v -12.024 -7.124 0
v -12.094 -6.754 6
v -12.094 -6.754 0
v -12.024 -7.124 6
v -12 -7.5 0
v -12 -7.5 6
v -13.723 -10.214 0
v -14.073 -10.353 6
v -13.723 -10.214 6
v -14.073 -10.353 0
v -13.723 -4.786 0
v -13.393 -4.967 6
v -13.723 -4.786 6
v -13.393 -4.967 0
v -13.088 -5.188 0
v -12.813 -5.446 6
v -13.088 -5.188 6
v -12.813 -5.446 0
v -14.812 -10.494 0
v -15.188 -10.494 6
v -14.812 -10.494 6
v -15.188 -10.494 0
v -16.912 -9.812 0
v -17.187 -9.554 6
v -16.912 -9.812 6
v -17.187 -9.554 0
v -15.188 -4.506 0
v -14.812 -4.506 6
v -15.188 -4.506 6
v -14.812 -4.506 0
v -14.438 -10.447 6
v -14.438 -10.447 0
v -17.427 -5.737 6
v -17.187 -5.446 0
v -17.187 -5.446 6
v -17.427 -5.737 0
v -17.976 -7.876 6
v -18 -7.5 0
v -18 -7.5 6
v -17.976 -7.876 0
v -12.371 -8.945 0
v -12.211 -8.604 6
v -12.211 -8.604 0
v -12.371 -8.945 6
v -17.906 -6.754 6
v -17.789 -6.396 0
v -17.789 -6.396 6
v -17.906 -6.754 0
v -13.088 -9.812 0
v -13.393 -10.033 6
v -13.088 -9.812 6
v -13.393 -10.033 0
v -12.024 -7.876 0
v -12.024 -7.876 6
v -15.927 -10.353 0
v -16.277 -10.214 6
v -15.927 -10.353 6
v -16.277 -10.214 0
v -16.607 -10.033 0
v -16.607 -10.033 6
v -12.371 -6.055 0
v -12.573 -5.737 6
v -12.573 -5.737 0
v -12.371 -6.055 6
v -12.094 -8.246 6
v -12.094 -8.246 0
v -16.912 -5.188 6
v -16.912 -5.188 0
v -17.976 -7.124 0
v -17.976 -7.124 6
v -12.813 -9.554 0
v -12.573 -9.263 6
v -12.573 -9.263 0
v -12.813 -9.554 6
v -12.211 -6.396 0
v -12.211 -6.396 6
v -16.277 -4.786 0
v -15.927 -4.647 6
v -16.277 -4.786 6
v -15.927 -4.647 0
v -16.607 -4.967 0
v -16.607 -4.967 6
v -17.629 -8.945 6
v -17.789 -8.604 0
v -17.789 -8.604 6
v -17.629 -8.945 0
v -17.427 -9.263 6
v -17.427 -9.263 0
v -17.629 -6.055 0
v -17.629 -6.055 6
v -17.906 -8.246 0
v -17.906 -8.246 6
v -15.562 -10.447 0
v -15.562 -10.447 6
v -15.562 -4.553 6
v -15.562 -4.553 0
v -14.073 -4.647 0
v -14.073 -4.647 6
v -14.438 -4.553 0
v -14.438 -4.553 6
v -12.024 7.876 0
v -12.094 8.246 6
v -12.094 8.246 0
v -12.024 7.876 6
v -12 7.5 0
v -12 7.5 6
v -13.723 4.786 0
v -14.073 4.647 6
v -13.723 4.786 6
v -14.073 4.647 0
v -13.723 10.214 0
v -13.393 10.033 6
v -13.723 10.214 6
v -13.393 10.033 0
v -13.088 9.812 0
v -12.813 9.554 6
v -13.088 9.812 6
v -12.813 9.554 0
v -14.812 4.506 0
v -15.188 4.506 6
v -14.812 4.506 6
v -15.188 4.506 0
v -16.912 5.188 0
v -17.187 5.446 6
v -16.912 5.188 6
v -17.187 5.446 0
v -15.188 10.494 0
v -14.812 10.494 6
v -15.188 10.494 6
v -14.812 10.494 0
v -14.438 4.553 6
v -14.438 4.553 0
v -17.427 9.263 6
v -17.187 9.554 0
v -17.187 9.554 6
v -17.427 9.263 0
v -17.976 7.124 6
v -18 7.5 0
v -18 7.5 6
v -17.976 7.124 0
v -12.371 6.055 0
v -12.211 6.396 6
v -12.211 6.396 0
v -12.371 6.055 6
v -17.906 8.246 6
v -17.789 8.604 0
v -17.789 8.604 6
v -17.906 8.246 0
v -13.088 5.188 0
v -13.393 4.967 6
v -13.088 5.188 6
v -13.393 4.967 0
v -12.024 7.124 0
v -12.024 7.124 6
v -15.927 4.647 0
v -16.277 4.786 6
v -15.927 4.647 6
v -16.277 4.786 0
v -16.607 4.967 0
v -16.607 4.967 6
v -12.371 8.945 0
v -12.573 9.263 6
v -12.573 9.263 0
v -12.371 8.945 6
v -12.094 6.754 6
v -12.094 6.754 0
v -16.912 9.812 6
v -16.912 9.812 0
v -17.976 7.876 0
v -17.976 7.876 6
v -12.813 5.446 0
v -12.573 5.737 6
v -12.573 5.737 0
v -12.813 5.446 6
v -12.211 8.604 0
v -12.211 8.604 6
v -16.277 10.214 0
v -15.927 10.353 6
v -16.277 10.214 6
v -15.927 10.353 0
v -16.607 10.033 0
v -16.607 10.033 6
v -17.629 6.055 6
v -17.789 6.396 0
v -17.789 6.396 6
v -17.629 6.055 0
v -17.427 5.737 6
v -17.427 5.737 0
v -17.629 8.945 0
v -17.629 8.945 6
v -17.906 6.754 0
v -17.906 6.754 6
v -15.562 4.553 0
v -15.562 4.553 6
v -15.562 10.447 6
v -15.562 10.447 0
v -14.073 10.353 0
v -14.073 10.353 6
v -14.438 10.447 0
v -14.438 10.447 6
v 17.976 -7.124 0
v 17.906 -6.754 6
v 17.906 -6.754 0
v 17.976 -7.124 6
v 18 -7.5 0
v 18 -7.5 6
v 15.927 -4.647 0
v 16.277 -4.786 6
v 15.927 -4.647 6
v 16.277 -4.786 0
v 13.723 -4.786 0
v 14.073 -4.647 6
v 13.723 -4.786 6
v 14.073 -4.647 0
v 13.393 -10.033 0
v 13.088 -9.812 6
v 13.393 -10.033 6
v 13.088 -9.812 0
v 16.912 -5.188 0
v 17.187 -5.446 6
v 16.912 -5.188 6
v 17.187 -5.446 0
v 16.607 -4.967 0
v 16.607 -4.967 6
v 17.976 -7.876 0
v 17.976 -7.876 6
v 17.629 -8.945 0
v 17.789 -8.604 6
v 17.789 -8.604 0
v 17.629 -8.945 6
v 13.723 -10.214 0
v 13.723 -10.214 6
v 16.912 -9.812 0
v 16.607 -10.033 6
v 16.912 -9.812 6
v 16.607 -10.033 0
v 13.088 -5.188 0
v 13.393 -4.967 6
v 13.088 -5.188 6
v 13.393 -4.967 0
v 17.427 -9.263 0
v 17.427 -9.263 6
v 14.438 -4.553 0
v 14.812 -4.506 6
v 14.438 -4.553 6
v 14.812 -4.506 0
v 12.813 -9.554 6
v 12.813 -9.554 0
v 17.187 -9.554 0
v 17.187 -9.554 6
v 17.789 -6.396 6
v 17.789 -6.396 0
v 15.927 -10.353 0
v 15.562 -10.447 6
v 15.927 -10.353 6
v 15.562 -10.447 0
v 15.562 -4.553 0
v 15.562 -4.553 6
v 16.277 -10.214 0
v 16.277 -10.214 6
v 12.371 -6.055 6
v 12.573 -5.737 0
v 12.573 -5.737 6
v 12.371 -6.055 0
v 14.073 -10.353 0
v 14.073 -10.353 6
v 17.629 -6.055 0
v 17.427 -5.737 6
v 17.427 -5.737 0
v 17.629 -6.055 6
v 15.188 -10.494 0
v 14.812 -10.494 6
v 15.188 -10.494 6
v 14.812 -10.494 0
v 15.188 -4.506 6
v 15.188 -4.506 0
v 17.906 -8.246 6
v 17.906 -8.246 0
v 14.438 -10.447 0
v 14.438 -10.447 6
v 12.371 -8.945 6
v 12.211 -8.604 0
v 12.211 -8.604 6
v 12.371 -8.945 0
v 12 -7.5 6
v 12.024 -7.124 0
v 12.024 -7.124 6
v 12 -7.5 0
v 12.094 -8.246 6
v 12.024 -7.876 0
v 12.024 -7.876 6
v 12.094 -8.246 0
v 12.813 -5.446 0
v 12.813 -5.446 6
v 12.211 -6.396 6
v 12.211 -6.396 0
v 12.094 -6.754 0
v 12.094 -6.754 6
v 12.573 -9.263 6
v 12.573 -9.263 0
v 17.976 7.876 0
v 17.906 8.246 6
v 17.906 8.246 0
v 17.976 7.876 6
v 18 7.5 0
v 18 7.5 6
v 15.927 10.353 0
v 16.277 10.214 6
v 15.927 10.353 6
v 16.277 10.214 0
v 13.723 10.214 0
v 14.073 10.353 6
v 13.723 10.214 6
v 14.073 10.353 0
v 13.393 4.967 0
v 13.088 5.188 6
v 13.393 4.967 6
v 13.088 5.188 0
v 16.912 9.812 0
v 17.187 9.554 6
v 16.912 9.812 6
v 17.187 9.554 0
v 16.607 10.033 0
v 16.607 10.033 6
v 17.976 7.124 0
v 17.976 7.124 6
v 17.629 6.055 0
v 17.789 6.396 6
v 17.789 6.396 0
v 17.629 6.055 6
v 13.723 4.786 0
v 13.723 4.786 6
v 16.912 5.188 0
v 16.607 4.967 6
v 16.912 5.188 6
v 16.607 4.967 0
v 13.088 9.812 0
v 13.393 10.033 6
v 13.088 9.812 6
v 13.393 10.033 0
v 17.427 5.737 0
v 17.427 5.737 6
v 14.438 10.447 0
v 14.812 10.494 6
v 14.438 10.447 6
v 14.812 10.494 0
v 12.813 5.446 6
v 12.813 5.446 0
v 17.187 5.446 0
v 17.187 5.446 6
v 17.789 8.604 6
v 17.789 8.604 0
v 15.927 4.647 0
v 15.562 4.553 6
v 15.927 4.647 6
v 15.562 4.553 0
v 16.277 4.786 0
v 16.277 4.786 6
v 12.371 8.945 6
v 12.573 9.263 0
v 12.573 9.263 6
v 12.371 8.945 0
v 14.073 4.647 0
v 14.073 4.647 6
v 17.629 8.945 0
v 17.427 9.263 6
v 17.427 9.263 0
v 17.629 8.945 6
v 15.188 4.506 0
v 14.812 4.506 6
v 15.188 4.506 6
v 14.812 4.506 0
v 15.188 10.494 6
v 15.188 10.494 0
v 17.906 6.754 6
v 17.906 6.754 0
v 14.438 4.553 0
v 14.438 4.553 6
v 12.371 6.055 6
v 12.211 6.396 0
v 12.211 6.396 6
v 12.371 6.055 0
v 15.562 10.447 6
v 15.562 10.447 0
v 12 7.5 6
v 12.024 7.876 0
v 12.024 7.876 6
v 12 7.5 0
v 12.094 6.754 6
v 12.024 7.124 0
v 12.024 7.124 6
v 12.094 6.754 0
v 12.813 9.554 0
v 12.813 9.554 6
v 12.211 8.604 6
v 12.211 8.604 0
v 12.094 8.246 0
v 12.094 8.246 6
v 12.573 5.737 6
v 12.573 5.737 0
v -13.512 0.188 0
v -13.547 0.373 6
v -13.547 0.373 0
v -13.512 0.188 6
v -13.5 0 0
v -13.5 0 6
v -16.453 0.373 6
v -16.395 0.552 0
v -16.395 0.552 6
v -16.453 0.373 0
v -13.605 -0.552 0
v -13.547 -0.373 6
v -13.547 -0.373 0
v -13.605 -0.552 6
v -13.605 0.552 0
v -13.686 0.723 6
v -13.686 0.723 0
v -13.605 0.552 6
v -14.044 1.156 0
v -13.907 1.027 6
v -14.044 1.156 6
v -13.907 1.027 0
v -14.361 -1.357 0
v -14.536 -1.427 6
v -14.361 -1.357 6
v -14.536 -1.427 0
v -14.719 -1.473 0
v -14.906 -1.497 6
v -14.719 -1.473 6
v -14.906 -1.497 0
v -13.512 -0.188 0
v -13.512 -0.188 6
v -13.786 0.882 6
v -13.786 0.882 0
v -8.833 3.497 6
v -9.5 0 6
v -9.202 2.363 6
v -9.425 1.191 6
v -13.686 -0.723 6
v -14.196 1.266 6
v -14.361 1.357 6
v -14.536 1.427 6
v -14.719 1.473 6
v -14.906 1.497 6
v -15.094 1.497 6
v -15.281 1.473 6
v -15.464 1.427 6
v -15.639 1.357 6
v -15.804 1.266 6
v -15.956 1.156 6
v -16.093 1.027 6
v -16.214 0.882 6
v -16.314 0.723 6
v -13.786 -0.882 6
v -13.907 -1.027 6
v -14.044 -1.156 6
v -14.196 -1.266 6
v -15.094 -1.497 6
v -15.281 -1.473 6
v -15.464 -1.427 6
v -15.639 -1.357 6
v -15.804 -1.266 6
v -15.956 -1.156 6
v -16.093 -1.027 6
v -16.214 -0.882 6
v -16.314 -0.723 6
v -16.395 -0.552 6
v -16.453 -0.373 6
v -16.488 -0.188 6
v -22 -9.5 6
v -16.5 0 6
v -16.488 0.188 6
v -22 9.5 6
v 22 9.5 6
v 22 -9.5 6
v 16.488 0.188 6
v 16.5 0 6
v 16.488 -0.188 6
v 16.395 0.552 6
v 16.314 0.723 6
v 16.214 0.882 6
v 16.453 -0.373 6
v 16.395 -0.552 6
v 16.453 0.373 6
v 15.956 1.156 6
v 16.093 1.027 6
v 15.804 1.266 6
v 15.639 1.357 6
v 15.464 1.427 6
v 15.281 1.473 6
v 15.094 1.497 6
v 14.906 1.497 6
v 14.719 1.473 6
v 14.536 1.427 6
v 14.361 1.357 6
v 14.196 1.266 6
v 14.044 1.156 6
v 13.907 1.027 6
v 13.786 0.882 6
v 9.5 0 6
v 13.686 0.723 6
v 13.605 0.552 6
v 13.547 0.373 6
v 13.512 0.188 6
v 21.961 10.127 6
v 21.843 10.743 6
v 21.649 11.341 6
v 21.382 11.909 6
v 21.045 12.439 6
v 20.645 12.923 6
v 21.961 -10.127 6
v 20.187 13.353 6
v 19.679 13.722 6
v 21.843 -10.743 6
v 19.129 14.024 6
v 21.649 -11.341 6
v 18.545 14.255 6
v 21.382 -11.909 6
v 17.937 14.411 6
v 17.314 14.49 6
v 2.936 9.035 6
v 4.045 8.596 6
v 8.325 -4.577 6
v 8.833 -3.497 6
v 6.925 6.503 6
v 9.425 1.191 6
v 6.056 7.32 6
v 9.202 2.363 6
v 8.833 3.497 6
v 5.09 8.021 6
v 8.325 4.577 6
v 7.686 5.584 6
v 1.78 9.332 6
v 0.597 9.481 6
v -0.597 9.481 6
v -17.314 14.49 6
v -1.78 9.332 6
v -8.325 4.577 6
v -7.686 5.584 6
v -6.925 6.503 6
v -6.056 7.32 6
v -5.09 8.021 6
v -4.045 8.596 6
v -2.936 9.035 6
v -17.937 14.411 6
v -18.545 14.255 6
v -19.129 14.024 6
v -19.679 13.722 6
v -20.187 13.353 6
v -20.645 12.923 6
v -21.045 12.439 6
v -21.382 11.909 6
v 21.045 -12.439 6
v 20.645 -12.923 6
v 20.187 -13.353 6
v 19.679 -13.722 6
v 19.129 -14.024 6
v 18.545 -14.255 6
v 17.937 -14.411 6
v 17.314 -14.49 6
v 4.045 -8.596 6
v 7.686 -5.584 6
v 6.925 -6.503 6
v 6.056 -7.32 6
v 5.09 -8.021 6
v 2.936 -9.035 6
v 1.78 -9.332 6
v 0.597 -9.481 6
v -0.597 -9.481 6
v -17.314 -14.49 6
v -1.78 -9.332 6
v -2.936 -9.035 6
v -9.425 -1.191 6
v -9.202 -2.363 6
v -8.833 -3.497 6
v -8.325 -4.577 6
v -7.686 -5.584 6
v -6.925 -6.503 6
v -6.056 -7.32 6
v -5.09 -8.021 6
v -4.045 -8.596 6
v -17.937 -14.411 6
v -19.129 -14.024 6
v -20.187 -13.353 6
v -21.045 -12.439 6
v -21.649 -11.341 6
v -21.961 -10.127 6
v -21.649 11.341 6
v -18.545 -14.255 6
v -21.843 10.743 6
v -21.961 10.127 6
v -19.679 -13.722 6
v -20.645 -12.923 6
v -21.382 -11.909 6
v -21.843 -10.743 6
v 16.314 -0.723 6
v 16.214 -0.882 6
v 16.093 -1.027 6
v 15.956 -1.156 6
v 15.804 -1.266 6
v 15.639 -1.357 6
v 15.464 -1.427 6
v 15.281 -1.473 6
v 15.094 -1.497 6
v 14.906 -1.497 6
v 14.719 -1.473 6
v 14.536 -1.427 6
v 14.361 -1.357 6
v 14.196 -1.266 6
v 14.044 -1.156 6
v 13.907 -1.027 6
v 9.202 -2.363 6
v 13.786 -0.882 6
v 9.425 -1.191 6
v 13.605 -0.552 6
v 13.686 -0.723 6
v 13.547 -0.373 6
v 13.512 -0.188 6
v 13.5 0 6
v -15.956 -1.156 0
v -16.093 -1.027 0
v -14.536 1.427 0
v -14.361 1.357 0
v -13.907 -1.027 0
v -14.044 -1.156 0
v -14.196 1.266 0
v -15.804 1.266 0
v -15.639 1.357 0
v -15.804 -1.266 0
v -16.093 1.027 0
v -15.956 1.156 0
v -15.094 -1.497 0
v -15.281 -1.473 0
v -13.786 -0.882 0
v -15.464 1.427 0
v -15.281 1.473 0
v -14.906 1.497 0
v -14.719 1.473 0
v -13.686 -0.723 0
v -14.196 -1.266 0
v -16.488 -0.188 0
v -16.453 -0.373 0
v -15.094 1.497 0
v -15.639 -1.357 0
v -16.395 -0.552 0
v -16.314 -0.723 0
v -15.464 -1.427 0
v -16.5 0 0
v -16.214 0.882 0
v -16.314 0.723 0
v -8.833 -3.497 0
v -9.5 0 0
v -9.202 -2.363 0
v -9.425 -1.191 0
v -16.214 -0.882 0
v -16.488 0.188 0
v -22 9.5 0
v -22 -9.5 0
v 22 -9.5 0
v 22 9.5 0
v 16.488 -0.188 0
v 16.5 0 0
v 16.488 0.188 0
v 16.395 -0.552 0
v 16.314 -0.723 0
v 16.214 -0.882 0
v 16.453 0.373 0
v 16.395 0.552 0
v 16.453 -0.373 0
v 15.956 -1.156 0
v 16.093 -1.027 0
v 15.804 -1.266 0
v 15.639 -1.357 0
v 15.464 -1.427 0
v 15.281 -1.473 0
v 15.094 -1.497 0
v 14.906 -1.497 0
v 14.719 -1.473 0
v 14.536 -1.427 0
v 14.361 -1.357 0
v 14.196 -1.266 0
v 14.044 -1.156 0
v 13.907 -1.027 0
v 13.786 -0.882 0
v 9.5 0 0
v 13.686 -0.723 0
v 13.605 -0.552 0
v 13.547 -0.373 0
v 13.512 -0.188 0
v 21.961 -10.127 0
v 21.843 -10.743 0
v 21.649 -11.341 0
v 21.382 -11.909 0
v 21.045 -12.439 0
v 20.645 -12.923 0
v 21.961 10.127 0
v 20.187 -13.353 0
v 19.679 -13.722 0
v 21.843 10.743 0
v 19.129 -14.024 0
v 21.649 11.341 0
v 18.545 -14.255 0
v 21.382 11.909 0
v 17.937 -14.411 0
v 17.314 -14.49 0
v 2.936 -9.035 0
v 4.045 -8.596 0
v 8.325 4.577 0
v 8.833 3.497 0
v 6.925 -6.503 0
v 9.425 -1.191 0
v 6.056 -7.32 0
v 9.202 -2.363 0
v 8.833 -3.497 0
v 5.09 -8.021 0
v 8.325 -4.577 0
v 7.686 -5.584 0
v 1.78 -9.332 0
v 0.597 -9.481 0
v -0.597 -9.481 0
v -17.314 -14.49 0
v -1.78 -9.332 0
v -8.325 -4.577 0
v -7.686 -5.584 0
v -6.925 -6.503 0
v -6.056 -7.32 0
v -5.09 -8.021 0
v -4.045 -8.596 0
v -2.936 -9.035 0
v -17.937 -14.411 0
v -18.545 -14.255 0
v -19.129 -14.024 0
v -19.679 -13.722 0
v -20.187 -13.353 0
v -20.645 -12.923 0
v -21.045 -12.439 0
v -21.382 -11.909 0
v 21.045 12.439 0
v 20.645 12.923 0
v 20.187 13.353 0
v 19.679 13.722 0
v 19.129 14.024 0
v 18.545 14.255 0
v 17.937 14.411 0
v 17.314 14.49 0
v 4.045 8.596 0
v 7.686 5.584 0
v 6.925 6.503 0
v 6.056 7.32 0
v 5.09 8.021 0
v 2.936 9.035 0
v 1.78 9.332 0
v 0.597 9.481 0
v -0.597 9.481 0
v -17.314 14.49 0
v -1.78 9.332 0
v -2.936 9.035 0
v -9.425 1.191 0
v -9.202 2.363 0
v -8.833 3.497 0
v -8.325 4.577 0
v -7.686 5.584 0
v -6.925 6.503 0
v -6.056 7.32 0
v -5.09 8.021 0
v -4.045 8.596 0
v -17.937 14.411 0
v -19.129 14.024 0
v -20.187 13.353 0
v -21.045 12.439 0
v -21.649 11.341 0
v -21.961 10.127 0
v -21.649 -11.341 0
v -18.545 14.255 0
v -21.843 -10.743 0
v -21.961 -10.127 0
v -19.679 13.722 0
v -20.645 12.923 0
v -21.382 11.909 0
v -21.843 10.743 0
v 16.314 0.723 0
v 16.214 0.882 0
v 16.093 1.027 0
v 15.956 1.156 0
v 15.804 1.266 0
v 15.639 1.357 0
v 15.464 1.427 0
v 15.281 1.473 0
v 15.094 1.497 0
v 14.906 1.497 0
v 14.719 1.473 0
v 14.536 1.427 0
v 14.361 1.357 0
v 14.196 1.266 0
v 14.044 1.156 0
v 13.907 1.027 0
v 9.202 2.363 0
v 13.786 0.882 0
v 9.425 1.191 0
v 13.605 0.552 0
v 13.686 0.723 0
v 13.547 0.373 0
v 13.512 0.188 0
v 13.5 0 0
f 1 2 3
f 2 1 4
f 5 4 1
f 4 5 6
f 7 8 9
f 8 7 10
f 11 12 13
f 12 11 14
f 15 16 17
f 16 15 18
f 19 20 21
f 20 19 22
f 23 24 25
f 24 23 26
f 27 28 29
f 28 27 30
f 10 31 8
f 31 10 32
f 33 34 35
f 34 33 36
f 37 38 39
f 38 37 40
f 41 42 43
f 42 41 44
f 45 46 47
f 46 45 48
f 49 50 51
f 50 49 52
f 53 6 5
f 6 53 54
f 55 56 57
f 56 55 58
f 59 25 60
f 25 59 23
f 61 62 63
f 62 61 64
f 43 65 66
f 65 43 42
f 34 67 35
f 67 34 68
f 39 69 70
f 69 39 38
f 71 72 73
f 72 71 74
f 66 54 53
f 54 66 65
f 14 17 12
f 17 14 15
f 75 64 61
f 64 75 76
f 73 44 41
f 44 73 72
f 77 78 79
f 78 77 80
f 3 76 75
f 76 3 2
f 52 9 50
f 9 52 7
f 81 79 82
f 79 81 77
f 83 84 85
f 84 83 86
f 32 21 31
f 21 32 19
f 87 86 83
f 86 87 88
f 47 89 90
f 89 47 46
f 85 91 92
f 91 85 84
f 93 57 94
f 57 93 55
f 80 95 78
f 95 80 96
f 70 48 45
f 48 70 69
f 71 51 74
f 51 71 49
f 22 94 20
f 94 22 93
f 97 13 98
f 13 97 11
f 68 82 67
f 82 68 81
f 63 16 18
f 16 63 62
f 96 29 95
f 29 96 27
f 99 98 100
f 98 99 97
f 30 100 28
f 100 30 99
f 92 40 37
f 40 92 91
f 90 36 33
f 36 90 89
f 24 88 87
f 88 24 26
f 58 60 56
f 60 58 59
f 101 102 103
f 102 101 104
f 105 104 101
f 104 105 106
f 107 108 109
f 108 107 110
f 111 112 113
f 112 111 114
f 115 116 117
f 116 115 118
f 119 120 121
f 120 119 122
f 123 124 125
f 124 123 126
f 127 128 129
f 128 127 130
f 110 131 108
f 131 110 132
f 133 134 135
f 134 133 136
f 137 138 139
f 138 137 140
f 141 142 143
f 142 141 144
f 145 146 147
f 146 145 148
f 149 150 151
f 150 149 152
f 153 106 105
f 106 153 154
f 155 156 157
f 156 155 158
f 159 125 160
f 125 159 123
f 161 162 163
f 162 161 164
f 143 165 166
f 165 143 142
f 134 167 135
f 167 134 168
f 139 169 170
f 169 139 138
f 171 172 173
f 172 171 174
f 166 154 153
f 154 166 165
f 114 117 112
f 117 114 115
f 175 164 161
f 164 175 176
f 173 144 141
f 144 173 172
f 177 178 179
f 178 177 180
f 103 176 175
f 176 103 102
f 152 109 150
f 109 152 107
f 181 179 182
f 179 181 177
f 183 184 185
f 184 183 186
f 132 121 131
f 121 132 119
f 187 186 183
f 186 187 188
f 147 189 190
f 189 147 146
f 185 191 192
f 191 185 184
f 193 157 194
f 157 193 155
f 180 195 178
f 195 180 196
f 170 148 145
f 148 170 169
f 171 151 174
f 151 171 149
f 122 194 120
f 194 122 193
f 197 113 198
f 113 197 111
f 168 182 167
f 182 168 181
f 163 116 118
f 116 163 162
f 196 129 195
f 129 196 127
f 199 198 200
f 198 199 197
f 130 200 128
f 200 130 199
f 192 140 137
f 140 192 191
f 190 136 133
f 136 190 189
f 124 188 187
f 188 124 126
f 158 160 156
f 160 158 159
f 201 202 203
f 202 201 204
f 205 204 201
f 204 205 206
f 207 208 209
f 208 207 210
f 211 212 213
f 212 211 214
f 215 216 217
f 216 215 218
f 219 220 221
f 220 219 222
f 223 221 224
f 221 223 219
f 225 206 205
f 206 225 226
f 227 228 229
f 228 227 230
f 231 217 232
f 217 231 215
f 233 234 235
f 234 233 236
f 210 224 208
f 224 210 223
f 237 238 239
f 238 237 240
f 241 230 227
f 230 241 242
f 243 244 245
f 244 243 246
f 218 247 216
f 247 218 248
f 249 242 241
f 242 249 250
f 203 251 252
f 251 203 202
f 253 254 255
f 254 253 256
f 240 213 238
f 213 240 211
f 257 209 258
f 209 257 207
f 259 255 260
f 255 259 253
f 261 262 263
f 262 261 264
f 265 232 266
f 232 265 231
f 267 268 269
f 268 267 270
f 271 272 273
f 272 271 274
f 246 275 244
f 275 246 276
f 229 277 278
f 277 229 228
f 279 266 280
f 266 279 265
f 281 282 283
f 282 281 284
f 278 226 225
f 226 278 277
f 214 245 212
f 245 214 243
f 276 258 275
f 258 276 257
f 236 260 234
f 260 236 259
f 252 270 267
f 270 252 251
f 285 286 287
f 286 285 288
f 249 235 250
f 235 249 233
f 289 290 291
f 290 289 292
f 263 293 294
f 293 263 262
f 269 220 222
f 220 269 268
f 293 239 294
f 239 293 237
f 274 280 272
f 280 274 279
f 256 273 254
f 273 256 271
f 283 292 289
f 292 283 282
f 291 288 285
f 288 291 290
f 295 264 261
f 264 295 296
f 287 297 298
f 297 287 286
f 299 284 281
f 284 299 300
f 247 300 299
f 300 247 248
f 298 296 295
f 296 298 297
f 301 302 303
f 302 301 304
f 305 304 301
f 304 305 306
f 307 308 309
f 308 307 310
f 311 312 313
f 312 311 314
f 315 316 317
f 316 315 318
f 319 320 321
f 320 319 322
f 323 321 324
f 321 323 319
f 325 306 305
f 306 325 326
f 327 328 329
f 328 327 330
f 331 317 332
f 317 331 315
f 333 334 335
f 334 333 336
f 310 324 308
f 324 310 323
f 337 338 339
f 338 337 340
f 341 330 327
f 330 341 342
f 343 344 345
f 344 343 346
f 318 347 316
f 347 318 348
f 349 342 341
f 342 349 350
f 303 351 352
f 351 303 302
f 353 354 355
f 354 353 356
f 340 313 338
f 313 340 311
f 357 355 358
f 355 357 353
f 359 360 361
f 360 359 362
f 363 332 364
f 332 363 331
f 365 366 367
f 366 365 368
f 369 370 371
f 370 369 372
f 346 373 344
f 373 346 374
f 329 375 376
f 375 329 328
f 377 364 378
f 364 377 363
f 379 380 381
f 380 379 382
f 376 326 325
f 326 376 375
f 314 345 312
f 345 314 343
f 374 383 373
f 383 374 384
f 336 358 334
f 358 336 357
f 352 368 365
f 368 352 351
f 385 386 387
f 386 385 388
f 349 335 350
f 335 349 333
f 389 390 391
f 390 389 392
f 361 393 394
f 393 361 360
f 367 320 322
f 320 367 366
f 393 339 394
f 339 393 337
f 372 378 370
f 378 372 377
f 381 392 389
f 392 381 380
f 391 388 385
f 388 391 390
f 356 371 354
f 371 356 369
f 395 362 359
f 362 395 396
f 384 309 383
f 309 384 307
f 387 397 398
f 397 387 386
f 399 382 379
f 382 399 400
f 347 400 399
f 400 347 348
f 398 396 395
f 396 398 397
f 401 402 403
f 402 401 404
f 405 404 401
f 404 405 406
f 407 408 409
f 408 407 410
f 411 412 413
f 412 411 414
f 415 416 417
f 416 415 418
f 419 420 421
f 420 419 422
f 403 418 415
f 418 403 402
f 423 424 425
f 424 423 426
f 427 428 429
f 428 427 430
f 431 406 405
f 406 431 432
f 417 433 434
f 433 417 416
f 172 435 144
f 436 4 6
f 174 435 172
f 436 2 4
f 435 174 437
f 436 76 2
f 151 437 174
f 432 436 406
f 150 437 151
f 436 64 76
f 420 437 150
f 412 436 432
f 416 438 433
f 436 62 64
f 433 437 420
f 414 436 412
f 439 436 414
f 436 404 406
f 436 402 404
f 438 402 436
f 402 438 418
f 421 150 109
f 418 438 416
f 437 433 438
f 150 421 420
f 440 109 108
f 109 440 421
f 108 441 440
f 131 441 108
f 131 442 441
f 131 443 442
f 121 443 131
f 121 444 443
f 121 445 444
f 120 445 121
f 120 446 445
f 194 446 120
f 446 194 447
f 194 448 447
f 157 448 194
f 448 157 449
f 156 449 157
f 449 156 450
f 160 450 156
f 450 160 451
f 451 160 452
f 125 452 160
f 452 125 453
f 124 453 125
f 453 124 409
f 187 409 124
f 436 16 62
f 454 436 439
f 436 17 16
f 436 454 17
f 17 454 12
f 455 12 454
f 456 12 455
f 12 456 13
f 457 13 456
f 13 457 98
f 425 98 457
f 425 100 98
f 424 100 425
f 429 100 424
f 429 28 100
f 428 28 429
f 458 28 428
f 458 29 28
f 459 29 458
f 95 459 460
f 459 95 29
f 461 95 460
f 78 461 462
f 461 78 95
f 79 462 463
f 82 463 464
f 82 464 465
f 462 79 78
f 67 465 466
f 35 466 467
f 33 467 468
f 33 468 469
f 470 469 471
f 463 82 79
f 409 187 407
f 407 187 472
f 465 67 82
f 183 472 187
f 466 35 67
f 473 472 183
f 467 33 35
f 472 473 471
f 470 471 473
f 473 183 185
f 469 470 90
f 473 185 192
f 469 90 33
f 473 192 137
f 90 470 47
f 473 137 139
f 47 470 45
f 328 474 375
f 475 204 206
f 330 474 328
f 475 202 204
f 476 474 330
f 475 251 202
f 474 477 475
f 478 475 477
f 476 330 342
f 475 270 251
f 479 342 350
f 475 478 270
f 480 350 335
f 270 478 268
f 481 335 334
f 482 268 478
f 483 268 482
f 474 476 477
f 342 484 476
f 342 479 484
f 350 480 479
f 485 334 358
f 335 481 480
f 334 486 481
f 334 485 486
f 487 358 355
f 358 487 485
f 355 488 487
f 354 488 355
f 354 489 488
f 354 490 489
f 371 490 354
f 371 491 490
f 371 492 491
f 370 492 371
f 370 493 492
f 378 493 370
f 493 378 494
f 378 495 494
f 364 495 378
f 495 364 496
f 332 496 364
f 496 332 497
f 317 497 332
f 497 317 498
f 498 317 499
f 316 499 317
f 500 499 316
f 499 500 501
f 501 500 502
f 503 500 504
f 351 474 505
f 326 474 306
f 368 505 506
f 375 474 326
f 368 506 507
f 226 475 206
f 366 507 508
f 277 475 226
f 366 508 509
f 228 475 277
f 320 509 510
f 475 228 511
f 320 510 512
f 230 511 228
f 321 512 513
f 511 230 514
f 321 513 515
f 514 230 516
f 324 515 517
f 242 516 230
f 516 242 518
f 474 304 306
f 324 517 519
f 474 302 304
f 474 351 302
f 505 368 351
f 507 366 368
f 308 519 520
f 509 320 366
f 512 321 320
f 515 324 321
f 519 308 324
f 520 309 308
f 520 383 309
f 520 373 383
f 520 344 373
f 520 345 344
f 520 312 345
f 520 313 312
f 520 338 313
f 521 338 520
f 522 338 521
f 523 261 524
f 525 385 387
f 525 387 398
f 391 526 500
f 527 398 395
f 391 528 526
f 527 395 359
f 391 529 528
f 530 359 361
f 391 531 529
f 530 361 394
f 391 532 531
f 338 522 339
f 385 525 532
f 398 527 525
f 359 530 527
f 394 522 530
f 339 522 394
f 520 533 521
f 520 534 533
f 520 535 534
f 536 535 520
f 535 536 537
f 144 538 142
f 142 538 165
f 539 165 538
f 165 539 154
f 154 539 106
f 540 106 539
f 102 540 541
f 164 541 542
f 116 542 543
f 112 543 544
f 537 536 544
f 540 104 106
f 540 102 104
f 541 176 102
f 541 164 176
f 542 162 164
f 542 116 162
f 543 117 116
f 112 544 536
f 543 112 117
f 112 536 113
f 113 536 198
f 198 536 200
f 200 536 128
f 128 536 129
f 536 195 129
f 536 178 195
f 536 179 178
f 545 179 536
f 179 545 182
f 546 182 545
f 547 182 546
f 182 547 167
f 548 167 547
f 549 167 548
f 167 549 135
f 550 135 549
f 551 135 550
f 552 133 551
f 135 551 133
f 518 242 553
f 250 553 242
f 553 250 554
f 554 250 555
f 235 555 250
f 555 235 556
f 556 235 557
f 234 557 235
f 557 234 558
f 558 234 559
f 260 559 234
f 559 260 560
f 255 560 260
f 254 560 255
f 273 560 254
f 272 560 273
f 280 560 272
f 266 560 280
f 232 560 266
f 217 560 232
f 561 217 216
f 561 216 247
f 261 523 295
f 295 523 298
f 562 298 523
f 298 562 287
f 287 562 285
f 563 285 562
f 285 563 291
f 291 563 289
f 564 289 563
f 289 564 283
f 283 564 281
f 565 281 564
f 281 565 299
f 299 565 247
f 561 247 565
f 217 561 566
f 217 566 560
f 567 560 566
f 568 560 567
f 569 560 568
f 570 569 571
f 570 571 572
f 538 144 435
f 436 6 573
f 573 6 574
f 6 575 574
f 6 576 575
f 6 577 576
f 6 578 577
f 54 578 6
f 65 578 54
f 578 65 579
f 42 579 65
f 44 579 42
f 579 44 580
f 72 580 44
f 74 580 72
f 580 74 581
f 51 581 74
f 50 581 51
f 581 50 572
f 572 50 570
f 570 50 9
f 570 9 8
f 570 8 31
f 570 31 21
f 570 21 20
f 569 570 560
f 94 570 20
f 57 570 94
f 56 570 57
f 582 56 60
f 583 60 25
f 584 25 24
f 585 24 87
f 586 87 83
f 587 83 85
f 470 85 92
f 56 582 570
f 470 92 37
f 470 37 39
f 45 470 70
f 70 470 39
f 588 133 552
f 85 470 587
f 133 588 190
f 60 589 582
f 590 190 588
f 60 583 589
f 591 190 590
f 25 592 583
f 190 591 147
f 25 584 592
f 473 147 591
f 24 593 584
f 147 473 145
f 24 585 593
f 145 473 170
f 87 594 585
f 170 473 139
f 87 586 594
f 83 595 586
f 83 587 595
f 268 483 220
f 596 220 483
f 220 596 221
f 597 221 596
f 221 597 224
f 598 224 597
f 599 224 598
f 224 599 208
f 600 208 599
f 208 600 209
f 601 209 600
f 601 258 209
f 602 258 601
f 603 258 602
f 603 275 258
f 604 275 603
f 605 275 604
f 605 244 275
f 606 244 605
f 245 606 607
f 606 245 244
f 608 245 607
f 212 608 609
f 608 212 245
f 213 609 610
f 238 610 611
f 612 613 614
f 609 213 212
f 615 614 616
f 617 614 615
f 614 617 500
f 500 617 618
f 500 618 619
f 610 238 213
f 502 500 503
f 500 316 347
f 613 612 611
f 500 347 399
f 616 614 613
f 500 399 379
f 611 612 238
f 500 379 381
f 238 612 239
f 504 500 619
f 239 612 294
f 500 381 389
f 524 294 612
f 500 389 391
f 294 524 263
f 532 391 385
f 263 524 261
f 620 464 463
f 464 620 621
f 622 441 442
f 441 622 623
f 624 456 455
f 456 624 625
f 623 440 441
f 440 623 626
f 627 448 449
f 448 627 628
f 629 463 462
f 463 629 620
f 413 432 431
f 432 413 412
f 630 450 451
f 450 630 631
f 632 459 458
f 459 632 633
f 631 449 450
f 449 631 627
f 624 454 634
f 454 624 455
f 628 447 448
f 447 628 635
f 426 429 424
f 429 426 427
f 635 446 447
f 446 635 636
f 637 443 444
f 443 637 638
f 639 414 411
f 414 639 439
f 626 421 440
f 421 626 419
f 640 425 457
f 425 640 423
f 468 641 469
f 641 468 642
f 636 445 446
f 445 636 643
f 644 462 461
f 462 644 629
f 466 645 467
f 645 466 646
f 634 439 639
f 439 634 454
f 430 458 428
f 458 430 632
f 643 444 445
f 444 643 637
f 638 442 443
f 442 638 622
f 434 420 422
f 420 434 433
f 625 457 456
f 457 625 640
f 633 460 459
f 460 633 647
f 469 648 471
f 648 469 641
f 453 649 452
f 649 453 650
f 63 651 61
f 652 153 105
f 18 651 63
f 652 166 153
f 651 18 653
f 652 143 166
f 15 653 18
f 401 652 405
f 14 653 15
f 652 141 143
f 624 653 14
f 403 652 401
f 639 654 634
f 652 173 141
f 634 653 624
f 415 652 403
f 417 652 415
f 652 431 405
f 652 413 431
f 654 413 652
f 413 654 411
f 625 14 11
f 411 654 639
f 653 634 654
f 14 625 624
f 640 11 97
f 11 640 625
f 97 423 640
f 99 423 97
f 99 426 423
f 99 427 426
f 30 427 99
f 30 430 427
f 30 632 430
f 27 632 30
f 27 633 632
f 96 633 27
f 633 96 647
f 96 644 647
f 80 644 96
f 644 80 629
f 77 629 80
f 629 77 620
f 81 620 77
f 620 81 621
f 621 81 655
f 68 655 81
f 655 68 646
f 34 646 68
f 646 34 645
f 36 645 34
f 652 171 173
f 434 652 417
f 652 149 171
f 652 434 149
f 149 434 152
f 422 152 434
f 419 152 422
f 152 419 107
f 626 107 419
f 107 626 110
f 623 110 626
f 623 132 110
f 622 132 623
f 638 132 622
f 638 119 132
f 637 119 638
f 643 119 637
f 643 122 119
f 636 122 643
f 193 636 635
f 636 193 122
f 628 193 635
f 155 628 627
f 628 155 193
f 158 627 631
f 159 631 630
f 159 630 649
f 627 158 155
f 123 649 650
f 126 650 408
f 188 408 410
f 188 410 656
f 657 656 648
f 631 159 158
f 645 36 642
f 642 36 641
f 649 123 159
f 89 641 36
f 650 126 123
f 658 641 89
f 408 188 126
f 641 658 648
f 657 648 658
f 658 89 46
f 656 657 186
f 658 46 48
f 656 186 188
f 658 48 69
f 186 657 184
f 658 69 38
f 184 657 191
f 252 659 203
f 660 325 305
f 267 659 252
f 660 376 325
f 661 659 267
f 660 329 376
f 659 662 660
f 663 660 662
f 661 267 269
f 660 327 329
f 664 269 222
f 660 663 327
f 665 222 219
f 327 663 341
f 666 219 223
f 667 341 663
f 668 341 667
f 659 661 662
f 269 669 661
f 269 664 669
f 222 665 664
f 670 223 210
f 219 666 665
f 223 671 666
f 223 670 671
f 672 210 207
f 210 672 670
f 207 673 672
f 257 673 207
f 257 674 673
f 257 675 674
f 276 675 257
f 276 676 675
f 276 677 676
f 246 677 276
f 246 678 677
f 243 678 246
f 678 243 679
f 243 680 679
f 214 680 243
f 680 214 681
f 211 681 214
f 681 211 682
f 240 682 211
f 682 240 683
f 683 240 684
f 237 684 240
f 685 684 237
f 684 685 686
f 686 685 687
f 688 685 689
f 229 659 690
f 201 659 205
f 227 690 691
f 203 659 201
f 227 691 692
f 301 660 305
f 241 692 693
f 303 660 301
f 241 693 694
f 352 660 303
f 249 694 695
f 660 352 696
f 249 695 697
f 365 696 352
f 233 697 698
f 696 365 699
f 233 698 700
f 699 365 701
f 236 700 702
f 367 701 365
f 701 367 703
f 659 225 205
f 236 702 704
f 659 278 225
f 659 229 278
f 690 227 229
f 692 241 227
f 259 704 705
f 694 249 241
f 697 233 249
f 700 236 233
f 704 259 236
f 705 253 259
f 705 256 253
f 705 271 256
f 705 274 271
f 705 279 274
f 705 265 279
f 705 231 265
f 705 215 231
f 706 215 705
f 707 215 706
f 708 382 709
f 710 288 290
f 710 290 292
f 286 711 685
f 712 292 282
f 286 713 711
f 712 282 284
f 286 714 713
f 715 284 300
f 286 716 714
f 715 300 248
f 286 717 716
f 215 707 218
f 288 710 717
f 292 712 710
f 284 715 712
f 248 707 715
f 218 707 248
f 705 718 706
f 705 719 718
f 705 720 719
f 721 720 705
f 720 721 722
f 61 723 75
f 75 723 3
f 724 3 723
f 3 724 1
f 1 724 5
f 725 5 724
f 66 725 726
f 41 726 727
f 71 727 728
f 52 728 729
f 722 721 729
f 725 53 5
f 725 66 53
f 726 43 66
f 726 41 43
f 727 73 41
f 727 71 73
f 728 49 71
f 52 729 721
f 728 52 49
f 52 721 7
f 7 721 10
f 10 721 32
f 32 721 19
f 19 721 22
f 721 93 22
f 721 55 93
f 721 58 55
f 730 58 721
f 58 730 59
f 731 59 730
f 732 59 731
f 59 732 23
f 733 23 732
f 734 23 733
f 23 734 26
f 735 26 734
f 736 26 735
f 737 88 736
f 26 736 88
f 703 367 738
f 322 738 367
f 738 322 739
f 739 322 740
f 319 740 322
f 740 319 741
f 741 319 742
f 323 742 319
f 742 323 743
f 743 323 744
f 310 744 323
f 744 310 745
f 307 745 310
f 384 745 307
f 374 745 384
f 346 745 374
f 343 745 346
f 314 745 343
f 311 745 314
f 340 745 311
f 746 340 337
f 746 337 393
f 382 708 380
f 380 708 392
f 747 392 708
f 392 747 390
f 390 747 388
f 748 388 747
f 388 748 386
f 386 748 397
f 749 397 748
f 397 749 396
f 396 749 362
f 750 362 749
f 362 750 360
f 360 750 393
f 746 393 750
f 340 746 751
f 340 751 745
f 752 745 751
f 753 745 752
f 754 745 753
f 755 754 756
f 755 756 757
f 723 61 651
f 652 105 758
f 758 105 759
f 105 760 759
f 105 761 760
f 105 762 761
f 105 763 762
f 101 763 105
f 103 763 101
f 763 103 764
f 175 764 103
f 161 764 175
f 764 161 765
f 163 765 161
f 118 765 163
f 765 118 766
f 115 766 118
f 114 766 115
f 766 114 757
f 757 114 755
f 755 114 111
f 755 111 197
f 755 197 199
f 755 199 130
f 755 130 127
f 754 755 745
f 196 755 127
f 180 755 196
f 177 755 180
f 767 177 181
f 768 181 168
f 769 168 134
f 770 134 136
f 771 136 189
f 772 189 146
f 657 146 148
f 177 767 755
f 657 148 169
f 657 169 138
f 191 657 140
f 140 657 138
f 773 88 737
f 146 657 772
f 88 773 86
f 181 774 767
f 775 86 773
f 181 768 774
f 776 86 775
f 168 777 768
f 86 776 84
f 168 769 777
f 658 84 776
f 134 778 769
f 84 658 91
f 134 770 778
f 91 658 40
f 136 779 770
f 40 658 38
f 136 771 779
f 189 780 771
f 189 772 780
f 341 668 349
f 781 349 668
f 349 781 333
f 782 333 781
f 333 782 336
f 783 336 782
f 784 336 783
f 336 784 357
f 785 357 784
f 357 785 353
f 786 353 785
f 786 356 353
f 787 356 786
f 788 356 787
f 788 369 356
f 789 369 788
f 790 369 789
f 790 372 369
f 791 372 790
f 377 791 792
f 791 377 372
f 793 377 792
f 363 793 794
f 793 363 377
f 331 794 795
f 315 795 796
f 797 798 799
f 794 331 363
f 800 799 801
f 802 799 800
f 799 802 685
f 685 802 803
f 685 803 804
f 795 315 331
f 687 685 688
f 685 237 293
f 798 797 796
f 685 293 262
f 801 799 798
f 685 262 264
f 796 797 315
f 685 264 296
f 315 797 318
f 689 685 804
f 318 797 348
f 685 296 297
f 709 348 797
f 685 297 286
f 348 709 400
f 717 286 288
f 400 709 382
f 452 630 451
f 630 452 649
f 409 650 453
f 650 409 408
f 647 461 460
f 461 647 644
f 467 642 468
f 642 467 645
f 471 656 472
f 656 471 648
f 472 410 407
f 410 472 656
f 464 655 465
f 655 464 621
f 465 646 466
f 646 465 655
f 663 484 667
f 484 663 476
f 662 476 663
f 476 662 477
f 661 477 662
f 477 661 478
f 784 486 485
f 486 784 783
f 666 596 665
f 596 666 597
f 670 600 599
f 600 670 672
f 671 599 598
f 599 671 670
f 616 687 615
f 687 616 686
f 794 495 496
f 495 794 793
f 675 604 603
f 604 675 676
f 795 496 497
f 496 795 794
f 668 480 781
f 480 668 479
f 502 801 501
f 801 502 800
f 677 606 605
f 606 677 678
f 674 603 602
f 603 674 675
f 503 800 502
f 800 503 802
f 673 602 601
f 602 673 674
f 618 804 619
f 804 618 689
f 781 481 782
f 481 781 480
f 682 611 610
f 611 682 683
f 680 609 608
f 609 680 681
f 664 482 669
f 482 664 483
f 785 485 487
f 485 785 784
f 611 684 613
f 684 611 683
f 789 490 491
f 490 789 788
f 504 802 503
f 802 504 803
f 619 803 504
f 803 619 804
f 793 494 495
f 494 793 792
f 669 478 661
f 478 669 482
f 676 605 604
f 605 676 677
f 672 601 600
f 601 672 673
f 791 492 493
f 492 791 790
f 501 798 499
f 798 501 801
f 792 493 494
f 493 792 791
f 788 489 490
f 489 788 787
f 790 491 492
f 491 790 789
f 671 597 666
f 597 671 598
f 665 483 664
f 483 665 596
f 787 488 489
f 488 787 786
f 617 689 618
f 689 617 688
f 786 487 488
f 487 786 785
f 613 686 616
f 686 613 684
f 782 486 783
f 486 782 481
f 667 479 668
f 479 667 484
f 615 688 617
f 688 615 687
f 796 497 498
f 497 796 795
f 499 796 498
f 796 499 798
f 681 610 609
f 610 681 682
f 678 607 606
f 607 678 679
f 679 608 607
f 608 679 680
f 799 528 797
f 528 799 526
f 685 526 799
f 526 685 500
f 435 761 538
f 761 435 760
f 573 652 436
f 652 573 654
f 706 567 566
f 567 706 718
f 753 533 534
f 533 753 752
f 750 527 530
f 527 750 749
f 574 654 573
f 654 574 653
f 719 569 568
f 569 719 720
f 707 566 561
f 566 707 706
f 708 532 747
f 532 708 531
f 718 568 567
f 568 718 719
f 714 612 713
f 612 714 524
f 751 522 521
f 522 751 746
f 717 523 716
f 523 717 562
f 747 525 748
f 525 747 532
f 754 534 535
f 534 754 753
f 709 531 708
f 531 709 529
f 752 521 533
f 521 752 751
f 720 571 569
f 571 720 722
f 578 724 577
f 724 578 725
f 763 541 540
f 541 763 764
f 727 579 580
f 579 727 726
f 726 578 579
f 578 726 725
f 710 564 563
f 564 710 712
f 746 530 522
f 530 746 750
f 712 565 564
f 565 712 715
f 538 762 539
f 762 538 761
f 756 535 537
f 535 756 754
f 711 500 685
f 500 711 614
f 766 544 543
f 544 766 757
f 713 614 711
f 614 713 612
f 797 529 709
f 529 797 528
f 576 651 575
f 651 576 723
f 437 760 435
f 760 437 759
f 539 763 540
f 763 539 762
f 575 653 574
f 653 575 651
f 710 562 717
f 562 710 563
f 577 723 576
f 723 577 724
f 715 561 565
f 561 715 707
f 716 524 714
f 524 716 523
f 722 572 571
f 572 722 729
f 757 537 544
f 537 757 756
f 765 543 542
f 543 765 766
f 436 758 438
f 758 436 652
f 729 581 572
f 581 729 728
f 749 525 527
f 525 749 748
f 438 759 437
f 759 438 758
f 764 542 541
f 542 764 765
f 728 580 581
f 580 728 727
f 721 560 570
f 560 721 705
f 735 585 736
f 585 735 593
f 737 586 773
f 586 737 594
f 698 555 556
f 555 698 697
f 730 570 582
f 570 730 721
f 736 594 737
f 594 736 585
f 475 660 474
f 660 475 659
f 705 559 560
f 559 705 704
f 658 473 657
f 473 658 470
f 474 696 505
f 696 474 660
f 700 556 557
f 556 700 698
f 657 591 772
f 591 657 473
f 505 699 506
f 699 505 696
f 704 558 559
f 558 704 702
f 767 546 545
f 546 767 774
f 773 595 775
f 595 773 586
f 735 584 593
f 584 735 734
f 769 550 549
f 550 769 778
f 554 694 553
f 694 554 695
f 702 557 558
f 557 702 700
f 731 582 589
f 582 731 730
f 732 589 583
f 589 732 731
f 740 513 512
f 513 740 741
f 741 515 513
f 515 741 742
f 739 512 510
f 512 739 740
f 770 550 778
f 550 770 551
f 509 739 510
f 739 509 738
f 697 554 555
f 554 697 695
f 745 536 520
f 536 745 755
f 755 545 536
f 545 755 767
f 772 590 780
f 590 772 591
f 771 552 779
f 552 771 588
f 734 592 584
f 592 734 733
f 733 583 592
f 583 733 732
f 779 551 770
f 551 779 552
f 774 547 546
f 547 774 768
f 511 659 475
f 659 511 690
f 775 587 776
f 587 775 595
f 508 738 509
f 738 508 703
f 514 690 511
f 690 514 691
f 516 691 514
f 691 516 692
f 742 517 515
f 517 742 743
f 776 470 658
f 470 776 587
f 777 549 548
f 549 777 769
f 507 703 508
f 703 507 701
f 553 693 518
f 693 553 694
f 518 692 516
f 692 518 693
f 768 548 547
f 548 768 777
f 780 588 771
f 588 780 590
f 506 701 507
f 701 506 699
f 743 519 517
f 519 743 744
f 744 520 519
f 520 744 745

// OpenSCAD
$fn = 50;


difference() {
	union() {
		hull() {
			translate(v = [-17.0000000000, 9.5000000000, 0]) {
				cylinder(h = 6, r = 5);
			}
			translate(v = [17.0000000000, 9.5000000000, 0]) {
				cylinder(h = 6, r = 5);
			}
			translate(v = [-17.0000000000, -9.5000000000, 0]) {
				cylinder(h = 6, r = 5);
			}
			translate(v = [17.0000000000, -9.5000000000, 0]) {
				cylinder(h = 6, r = 5);
			}
		}
	}
	union() {
		#translate(v = [-15.0000000000, -7.5000000000, 0]) {
			cylinder(h = 6, r = 3.0000000000);
		}
		#translate(v = [-15.0000000000, 7.5000000000, 0]) {
			cylinder(h = 6, r = 3.0000000000);
		}
		#translate(v = [15.0000000000, -7.5000000000, 0]) {
			cylinder(h = 6, r = 3.0000000000);
		}
		#translate(v = [15.0000000000, 7.5000000000, 0]) {
			cylinder(h = 6, r = 3.0000000000);
		}
		#translate(v = [-15.0000000000, -7.5000000000, -100.0000000000]) {
			cylinder(h = 200, r = 3.0000000000);
		}
		#translate(v = [-15.0000000000, 7.5000000000, -100.0000000000]) {
			cylinder(h = 200, r = 3.0000000000);
		}
		#translate(v = [15.0000000000, -7.5000000000, -100.0000000000]) {
			cylinder(h = 200, r = 3.0000000000);
		}
		#translate(v = [15.0000000000, 7.5000000000, -100.0000000000]) {
			cylinder(h = 200, r = 3.0000000000);
		}
		#translate(v = [-15.0000000000, -7.5000000000, 0]) {
			cylinder(h = 6, r = 1.5000000000);
		}
		#translate(v = [-15.0000000000, 0.0000000000, 0]) {
			cylinder(h = 6, r = 1.5000000000);
		}
		#translate(v = [-15.0000000000, 7.5000000000, 0]) {
			cylinder(h = 6, r = 1.5000000000);
		}
		#translate(v = [15.0000000000, -7.5000000000, 0]) {
			cylinder(h = 6, r = 1.5000000000);
		}
		#translate(v = [15.0000000000, 0.0000000000, 0]) {
			cylinder(h = 6, r = 1.5000000000);
		}
		#translate(v = [15.0000000000, 7.5000000000, 0]) {
			cylinder(h = 6, r = 1.5000000000);
		}
		#translate(v = [-15.0000000000, -7.5000000000, 0]) {
			cylinder(h = 6, r = 1.5000000000);
		}
		#translate(v = [-15.0000000000, 0.0000000000, 0]) {
			cylinder(h = 6, r = 1.5000000000);
		}
		#translate(v = [-15.0000000000, 7.5000000000, 0]) {
			cylinder(h = 6, r = 1.5000000000);
		}
		#translate(v = [15.0000000000, -7.5000000000, 0]) {
			cylinder(h = 6, r = 1.5000000000);
		}
		#translate(v = [15.0000000000, 0.0000000000, 0]) {
			cylinder(h = 6, r = 1.5000000000);
		}
		#translate(v = [15.0000000000, 7.5000000000, 0]) {
			cylinder(h = 6, r = 1.5000000000);
		}
		#translate(v = [-15.0000000000, -7.5000000000, 0]) {
			cylinder(h = 6, r = 1.5000000000);
		}
		#translate(v = [-15.0000000000, 0.0000000000, 0]) {
			cylinder(h = 6, r = 1.5000000000);
		}
		#translate(v = [-15.0000000000, 7.5000000000, 0]) {
			cylinder(h = 6, r = 1.5000000000);
		}
		#translate(v = [15.0000000000, -7.5000000000, 0]) {
			cylinder(h = 6, r = 1.5000000000);
		}
		#translate(v = [15.0000000000, 0.0000000000, 0]) {
			cylinder(h = 6, r = 1.5000000000);
		}
		#translate(v = [15.0000000000, 7.5000000000, 0]) {
			cylinder(h = 6, r = 1.5000000000);
		}
		#cylinder(h = 6, r = 9.5000000000);
	}
}
